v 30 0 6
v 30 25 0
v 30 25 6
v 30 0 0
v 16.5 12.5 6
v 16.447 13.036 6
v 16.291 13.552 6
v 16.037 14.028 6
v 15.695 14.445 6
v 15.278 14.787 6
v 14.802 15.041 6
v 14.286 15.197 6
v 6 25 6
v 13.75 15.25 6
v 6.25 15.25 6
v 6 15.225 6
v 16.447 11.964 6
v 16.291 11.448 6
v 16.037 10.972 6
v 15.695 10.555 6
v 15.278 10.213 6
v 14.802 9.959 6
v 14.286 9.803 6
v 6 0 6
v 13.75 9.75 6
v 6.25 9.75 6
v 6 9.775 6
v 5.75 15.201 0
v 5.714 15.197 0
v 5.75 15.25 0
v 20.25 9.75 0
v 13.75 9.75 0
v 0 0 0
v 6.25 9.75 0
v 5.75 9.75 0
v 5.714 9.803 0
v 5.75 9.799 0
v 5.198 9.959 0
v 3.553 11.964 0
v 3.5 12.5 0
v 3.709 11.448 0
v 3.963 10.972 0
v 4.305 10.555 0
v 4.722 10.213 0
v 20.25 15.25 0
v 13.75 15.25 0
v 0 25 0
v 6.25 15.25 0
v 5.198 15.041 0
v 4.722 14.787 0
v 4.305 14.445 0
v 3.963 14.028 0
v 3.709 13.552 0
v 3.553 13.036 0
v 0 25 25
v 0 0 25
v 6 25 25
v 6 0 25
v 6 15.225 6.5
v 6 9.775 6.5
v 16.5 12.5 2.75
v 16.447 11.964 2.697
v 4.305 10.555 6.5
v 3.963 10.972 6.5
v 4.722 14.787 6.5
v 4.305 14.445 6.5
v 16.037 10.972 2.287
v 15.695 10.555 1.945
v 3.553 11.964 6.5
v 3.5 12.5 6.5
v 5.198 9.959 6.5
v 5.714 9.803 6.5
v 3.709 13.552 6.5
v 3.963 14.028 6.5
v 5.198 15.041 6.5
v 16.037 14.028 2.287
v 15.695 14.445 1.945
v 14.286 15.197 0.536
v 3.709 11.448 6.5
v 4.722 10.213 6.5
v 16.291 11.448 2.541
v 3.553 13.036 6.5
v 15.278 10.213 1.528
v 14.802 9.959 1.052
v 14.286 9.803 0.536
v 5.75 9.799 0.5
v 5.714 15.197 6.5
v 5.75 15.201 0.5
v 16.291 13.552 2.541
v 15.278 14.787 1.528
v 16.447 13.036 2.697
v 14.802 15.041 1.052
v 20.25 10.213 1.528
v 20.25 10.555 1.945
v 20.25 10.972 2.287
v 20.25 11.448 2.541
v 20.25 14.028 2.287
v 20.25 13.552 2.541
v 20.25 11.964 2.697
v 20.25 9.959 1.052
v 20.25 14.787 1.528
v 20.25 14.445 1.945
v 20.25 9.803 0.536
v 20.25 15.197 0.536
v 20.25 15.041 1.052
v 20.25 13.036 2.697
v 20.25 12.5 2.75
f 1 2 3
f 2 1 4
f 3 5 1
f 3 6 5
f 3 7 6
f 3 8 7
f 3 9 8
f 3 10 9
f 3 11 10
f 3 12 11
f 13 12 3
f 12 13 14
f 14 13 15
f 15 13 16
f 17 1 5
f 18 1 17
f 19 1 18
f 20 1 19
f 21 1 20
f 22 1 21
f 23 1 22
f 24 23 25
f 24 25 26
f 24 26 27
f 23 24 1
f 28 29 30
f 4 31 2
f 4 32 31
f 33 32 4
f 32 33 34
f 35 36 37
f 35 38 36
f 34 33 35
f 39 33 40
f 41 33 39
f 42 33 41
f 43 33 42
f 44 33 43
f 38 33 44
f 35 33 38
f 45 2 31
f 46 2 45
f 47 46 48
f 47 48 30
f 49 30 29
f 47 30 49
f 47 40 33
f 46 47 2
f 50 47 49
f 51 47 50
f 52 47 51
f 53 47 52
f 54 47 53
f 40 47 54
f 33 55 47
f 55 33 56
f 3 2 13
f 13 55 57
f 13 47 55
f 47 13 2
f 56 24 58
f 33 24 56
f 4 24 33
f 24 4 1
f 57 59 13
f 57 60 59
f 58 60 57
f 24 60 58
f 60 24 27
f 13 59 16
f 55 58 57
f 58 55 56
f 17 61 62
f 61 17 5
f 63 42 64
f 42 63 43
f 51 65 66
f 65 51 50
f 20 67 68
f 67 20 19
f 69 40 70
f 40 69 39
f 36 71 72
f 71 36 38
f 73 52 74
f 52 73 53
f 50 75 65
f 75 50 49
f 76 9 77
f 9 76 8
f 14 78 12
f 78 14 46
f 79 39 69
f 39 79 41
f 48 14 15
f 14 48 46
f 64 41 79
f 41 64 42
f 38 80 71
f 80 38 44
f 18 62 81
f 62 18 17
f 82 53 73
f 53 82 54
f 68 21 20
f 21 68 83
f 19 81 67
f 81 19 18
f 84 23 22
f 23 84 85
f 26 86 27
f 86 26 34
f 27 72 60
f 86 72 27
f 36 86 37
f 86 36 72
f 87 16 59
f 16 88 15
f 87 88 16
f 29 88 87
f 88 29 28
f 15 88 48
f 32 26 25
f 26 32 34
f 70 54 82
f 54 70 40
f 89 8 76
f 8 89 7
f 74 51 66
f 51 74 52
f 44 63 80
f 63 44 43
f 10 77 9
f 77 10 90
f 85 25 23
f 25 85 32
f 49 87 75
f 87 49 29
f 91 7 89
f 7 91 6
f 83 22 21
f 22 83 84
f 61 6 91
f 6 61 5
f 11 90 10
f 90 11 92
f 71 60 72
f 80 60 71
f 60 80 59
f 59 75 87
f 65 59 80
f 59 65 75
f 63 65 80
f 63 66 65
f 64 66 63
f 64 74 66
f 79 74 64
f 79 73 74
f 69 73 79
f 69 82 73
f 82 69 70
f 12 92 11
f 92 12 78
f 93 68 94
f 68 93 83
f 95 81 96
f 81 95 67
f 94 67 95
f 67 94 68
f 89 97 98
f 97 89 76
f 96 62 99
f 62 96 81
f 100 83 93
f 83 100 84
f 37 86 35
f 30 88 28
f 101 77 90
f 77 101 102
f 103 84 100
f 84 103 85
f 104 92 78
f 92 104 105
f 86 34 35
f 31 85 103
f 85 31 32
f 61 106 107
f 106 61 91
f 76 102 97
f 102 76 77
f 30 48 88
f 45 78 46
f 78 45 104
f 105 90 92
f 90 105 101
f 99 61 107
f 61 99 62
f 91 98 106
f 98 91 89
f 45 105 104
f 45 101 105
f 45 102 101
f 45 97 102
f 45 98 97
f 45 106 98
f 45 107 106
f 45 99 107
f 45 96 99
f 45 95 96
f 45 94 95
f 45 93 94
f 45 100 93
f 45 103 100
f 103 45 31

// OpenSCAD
$fn = 32;

// ----------------------------------------------------------------------
// L-bracket: 30 x 25 x 25 mm
// ----------------------------------------------------------------------

// --- parameters (mm) ---
base_len = 30;            // horizontal leg, X
upright_h = 25;           // vertical leg, Z
flange_w = 25;            // bracket depth, Y
mat_t = 6;                // plate thickness
hole_d = 4.5;             // clearance for M4
slot_w = 5.5;             // euro screw slot width
slot_l = 13;              // euro screw slot length

module hole_z(px, py) {
  translate([px, py, -0.5]) cylinder(h = mat_t + 1, d = hole_d);
}
module hole_x(pz, py) {
  translate([-0.5, py, pz]) rotate([0, 90, 0]) cylinder(h = mat_t + 1, d = hole_d);
}
module euro_slot_z(px, py) {
  hull() {
    translate([px - (slot_l - slot_w) / 2, py, -0.5]) cylinder(h = mat_t + 1, d = slot_w);
    translate([px + (slot_l - slot_w) / 2, py, -0.5]) cylinder(h = mat_t + 1, d = slot_w);
  }
}
module euro_slot_x(pz, py) {
  translate([-0.5, 0, 0]) rotate([0, 90, 0]) hull() {
    translate([0, py, pz - (slot_l - slot_w) / 2]) cylinder(h = mat_t + 1, d = slot_w);
    translate([0, py, pz + (slot_l - slot_w) / 2]) cylinder(h = mat_t + 1, d = slot_w);
  }
}

difference() {
  union() {
    /* horizontal leg */
    cube([base_len, flange_w, mat_t]);
    /* vertical leg, overlapping the corner block */
    cube([mat_t, flange_w, upright_h]);
  }
  euro_slot_z(10, 12.5);
  euro_slot_x(10, 12.5);
}
